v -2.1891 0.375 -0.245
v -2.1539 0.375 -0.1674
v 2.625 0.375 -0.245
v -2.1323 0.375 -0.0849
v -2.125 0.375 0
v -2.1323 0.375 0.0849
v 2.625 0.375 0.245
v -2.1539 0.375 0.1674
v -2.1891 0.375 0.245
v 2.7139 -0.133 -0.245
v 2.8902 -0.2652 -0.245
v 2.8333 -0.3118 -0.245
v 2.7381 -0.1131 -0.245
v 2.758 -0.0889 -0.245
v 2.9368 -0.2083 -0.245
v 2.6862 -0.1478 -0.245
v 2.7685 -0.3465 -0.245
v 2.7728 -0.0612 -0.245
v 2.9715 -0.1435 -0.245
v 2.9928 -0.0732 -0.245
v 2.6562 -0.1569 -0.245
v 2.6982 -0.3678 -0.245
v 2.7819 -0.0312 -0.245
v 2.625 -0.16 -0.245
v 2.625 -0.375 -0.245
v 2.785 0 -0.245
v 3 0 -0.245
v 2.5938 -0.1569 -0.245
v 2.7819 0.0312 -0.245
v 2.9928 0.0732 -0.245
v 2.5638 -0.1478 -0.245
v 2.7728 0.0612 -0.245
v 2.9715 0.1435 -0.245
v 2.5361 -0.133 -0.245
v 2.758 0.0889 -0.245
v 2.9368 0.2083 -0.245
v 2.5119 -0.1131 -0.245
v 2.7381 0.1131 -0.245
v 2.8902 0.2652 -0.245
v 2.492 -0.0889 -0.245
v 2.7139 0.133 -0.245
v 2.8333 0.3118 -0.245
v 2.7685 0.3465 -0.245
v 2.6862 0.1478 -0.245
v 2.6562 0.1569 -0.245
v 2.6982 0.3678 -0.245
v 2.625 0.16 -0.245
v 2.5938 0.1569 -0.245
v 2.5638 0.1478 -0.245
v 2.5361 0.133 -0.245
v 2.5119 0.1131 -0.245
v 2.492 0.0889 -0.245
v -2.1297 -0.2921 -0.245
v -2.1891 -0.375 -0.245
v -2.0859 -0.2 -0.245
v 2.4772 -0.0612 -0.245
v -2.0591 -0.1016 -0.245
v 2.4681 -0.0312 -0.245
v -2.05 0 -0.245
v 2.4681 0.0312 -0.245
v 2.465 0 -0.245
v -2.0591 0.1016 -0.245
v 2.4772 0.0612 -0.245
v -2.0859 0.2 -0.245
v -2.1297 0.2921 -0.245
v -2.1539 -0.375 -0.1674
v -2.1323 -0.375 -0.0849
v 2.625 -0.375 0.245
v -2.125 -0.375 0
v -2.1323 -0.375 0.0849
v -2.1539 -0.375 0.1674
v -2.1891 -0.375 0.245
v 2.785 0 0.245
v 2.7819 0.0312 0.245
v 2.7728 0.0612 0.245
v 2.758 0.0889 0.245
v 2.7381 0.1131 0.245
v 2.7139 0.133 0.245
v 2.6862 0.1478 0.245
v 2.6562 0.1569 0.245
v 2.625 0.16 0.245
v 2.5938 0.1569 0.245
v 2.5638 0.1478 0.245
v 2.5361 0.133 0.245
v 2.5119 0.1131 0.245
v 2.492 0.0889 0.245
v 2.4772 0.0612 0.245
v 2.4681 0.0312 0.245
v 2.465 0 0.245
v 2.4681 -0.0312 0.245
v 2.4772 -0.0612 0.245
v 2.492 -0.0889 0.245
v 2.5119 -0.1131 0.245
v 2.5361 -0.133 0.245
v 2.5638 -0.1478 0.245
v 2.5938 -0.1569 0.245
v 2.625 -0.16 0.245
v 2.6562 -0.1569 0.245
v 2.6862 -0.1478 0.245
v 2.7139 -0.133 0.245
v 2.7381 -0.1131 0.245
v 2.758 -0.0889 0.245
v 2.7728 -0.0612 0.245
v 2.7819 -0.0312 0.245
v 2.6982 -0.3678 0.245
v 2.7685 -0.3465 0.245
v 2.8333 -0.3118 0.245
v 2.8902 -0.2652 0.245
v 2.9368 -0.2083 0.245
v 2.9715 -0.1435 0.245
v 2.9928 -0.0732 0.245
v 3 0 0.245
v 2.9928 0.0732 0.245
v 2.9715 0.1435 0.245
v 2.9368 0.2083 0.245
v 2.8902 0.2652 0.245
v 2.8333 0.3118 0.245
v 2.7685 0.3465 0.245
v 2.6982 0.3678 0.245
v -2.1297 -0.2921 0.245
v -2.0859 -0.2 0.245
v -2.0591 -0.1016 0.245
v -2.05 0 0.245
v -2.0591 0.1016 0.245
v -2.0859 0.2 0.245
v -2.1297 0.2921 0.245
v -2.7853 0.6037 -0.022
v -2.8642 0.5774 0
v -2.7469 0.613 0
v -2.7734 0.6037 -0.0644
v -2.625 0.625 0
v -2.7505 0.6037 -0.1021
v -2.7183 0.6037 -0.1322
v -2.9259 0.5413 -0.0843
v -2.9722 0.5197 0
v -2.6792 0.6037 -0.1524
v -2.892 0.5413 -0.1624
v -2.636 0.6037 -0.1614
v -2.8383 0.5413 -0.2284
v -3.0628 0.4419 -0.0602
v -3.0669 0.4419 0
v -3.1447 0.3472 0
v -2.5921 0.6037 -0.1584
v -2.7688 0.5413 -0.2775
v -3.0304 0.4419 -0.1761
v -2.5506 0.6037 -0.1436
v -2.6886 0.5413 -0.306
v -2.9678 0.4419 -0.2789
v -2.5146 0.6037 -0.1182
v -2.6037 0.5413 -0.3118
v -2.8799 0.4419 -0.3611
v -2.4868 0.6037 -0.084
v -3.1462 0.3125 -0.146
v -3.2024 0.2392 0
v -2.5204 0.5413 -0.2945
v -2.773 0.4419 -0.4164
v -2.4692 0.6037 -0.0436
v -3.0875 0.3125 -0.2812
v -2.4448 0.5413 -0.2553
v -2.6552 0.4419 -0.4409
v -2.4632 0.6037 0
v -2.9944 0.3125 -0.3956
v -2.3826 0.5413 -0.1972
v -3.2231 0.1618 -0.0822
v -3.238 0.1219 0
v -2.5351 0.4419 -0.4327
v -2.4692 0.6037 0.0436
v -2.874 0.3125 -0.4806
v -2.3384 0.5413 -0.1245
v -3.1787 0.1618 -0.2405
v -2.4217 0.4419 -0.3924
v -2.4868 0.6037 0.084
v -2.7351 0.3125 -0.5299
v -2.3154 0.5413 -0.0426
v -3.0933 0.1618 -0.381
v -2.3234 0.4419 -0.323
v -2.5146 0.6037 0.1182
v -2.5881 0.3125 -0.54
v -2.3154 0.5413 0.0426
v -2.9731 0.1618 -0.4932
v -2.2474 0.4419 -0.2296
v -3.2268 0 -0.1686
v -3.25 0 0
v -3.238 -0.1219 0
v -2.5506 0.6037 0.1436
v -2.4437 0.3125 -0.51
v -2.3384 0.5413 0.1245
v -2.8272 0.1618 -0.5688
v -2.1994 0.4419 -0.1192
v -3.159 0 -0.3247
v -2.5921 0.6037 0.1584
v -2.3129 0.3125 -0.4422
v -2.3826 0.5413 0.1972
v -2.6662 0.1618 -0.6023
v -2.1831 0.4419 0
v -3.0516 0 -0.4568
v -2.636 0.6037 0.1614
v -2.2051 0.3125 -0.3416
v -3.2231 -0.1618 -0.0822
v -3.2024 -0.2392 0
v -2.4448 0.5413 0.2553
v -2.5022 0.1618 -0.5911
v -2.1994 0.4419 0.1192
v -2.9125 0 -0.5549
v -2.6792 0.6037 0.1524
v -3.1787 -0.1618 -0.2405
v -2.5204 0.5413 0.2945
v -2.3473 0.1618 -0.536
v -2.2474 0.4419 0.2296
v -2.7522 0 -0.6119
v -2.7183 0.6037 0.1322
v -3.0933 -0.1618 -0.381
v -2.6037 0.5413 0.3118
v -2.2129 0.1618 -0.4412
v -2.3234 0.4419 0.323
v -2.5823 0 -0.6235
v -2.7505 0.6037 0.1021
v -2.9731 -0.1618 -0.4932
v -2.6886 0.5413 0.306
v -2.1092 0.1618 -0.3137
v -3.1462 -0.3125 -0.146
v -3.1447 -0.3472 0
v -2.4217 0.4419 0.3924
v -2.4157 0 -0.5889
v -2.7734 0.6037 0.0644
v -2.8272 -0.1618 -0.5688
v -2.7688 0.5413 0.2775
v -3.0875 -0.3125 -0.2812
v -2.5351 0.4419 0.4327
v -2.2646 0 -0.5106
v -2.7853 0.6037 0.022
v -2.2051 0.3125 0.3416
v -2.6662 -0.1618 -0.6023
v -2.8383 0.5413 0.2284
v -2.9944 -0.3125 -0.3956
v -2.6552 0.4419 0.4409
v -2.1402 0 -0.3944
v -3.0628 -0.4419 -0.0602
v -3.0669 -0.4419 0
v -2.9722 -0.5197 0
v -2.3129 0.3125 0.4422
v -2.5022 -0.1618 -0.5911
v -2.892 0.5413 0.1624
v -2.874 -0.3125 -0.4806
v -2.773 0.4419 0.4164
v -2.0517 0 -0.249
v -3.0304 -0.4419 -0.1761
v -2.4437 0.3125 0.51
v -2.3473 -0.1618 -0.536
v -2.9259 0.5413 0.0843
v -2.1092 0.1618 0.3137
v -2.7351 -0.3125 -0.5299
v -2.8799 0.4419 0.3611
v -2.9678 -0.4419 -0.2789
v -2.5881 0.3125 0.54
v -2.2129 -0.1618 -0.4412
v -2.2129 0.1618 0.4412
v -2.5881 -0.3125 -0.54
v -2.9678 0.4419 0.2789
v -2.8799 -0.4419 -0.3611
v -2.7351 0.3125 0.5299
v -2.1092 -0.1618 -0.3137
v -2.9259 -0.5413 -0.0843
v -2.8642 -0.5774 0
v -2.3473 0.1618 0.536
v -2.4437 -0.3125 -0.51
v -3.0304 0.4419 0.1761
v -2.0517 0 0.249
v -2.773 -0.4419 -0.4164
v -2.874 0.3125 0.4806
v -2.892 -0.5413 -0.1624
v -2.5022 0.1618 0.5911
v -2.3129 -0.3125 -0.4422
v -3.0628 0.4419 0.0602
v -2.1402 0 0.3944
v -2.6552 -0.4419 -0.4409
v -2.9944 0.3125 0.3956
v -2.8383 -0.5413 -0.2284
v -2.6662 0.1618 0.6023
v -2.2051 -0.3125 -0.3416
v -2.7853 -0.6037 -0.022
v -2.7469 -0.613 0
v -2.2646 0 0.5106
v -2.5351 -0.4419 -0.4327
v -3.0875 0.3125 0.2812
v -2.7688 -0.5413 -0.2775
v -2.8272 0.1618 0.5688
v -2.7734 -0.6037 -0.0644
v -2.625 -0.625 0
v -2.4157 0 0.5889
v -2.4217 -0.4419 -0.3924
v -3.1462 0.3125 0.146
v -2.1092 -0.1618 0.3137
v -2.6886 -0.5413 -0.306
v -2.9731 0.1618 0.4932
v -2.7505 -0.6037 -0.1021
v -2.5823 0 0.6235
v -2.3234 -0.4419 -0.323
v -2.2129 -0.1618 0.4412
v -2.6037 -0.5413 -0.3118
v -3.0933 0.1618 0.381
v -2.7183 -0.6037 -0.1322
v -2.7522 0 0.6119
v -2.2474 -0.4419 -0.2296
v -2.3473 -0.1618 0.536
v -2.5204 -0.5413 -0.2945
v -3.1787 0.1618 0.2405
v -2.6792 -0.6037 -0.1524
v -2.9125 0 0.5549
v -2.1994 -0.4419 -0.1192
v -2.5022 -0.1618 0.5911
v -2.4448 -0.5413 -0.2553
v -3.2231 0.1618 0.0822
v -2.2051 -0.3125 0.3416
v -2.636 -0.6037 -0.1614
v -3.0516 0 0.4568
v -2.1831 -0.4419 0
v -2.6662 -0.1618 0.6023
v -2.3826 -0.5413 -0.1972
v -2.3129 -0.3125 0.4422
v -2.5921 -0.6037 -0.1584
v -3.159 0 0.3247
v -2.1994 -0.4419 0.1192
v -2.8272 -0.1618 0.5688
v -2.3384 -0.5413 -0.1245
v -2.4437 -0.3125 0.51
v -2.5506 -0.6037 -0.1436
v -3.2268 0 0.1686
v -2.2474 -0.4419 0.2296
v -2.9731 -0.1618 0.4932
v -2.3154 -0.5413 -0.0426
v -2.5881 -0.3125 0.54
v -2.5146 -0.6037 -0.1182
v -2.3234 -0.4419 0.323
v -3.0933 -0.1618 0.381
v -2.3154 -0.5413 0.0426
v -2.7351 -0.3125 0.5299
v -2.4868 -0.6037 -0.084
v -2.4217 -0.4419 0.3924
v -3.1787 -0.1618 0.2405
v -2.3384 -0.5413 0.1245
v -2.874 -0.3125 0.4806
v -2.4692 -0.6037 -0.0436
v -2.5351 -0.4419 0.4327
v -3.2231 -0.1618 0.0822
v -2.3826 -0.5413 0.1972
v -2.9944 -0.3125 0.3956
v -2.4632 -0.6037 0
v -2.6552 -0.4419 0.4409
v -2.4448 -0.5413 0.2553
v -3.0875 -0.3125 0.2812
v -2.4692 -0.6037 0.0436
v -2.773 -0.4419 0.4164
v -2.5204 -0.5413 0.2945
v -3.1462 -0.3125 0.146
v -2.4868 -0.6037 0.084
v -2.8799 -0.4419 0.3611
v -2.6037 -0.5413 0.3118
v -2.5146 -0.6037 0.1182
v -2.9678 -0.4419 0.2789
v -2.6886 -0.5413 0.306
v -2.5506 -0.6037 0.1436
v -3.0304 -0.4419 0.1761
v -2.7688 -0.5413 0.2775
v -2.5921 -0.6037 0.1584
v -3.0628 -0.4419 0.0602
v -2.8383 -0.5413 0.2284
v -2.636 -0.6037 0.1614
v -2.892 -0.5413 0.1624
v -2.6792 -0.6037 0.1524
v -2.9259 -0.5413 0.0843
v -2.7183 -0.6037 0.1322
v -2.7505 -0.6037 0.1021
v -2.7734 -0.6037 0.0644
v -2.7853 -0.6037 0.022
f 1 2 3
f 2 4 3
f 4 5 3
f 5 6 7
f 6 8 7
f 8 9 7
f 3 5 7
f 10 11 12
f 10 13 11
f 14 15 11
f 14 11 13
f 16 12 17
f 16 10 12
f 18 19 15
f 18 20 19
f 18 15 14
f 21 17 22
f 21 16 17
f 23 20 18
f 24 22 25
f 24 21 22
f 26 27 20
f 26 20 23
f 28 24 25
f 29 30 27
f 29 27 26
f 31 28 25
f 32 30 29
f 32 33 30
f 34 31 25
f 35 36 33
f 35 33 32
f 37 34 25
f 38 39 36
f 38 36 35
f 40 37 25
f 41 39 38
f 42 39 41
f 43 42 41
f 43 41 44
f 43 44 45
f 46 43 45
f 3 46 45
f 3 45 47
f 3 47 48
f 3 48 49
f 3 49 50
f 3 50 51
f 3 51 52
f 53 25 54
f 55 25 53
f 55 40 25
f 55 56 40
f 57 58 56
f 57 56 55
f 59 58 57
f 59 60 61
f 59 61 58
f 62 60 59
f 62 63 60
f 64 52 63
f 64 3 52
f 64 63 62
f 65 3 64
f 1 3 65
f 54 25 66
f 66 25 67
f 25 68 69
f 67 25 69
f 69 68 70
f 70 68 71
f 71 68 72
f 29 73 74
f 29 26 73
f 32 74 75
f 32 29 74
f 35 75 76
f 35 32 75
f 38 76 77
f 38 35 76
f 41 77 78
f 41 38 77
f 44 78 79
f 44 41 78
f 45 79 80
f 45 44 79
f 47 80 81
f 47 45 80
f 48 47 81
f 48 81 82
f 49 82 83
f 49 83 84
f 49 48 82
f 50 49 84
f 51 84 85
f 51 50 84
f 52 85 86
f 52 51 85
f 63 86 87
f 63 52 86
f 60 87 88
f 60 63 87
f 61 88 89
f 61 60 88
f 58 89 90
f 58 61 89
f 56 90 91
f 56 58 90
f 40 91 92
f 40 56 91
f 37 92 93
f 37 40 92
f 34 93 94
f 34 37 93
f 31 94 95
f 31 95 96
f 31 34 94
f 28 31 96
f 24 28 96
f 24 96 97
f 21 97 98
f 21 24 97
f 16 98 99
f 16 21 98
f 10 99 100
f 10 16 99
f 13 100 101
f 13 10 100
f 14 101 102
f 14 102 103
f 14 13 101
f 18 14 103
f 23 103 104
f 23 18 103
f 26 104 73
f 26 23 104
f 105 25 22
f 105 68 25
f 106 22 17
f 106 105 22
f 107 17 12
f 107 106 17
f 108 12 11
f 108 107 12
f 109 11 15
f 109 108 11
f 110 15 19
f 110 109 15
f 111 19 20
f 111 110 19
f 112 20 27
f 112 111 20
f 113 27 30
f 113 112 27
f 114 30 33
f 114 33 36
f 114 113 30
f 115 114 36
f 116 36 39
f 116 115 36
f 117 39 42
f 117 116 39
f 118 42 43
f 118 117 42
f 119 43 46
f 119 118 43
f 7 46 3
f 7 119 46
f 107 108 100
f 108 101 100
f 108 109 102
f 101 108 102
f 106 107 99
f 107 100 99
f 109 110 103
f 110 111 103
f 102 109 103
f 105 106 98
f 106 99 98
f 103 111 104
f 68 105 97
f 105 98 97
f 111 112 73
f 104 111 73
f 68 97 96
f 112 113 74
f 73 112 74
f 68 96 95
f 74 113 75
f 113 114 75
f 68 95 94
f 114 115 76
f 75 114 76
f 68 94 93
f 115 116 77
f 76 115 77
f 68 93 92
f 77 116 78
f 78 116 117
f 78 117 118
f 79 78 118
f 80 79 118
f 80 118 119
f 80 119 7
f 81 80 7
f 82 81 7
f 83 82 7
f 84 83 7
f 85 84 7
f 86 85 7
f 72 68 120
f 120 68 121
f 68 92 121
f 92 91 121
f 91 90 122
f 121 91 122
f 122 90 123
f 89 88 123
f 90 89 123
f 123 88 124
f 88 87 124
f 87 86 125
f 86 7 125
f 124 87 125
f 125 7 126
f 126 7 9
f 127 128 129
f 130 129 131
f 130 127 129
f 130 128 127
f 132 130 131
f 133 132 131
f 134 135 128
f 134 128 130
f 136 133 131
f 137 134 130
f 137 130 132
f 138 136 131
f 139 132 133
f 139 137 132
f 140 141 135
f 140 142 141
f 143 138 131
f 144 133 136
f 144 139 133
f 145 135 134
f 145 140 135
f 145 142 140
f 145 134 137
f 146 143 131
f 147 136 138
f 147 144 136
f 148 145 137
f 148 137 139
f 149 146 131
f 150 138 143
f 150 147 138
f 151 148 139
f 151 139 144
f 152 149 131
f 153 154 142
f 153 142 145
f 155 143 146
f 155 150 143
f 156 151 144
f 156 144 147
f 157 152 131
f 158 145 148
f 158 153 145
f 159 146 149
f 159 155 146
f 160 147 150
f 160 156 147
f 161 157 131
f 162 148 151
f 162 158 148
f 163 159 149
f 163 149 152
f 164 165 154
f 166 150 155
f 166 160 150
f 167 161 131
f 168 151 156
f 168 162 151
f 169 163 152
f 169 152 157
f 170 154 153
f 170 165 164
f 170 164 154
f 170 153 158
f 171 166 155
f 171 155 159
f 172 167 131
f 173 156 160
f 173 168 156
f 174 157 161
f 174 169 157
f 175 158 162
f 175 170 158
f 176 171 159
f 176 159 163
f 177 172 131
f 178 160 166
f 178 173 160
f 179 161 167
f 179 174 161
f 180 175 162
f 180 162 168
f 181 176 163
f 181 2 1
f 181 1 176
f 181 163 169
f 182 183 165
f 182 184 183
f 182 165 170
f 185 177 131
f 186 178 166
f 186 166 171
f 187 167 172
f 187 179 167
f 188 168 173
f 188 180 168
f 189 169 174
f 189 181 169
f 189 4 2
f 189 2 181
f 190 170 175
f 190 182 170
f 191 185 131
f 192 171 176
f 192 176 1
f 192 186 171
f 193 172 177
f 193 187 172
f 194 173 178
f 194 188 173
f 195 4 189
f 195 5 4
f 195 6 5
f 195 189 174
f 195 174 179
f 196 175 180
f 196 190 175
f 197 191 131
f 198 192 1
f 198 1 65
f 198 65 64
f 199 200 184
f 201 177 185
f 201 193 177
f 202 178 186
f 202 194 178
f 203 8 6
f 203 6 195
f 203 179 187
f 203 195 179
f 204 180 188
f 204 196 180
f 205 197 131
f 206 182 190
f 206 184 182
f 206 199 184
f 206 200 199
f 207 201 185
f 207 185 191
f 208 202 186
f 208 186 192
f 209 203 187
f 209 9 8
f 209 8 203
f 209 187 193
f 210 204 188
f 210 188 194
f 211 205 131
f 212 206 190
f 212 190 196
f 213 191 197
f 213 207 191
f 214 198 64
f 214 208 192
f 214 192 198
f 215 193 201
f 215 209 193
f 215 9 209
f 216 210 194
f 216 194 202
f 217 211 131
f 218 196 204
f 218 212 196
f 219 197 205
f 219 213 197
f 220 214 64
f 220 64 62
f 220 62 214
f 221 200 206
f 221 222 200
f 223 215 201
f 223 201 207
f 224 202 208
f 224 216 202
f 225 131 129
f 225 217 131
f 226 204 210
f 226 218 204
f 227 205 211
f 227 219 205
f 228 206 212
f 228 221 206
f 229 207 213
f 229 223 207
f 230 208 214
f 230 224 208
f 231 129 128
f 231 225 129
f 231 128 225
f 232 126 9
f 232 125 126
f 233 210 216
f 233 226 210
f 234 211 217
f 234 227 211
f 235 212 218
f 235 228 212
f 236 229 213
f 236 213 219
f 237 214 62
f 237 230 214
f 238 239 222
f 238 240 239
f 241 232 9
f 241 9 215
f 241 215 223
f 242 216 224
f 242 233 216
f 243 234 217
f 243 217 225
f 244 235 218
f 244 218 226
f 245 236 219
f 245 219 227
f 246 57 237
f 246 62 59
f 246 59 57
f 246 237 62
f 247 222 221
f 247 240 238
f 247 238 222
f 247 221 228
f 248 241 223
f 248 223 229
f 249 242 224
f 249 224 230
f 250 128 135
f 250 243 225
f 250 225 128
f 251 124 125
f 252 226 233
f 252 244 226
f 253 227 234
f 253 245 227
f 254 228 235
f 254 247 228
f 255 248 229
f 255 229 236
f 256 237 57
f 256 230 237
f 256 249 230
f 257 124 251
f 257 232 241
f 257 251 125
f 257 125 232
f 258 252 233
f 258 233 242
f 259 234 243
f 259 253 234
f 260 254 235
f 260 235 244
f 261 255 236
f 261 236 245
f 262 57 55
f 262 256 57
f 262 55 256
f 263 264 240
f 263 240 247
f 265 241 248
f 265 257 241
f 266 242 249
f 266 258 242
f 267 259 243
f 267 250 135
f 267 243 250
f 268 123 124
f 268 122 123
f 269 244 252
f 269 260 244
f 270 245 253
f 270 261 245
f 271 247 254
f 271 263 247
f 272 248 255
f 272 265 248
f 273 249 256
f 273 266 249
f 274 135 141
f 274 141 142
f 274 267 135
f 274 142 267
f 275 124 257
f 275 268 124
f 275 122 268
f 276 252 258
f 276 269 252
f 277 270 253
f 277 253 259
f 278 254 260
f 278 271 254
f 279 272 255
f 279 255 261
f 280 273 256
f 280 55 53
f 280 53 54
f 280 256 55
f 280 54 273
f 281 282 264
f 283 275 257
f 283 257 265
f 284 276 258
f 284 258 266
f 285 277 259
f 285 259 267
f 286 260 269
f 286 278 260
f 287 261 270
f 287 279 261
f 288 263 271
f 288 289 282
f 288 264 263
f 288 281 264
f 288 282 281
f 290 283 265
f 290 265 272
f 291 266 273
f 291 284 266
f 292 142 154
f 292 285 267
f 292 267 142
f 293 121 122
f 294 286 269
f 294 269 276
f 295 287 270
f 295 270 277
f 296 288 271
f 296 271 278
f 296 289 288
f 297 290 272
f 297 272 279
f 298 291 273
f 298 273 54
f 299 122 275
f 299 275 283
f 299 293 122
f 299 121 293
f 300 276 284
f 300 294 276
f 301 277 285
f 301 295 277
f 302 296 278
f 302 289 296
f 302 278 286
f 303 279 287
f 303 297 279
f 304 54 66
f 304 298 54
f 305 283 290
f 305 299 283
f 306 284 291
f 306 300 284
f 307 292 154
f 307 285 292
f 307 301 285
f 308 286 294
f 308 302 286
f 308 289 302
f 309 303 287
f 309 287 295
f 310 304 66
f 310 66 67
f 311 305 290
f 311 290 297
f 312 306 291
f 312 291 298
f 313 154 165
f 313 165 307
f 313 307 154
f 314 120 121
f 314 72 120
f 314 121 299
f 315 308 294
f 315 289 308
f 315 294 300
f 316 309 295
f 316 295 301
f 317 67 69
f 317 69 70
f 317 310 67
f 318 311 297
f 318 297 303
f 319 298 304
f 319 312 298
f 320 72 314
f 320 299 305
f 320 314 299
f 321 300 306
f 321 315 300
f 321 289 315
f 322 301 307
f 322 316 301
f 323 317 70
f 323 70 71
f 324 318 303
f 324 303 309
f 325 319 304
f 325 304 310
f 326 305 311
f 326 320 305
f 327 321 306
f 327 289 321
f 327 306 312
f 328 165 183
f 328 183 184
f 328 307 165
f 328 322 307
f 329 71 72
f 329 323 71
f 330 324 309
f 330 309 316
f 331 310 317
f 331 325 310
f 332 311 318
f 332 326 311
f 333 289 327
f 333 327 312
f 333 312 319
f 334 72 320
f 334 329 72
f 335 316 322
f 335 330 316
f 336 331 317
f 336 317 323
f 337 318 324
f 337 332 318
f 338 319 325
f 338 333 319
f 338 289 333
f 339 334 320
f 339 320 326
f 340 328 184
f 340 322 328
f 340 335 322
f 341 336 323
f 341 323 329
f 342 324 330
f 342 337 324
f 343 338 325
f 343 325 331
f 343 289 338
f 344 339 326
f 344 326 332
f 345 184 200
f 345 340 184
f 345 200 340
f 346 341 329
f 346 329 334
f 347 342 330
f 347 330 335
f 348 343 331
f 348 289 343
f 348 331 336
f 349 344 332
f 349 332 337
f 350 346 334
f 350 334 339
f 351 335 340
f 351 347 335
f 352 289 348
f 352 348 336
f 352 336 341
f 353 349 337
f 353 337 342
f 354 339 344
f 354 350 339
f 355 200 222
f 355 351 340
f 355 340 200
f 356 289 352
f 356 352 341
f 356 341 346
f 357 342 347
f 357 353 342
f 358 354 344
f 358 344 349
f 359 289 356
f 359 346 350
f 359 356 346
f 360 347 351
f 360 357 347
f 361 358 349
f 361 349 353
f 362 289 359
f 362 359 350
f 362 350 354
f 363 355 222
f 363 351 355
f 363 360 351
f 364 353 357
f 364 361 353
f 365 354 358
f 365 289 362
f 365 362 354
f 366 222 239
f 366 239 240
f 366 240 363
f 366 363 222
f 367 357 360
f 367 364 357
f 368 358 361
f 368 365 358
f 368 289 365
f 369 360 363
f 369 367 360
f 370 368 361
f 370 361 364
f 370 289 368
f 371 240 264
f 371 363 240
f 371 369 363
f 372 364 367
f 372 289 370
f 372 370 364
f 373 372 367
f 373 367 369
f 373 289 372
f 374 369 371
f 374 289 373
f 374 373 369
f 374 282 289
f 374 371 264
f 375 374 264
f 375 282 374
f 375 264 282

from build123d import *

# Parameters (mm, degrees)
SKETCH_R  = 0.16
PAD_DEPTH = 0.245


with BuildPart() as part:
    # Sketch → Pad (new body, symmetric)
    with BuildSketch(Plane.XY):
        with BuildLine():
            Line((-2.625, 0.375), (2.625, 0.375))
            ThreePointArc((2.625, -0.375), (3, 0), (2.625, 0.375))
            Line((2.625, -0.375), (-2.625, -0.375))
            ThreePointArc((-2.625, 0.375), (-3, 0), (-2.625, -0.375))
        make_face()
        with Locations((2.625, 0)):
            Circle(SKETCH_R, mode=Mode.SUBTRACT)
    extrude(amount=PAD_DEPTH, both=True)

    # Sketch001 → Revolution (revolve)
    with BuildSketch(Plane.XY):
        with BuildLine():
            Line((-2.625, 0.625), (-2.625, 0))
            Line((-2.625, 0), (-2.625, -0.625))
            ThreePointArc((-2.625, 0.625), (-3.25, 0), (-2.625, -0.625))
        make_face()
    revolve(axis=Axis((-2.625, 0, 0), (0, -1, 0)))


solid = part.part
